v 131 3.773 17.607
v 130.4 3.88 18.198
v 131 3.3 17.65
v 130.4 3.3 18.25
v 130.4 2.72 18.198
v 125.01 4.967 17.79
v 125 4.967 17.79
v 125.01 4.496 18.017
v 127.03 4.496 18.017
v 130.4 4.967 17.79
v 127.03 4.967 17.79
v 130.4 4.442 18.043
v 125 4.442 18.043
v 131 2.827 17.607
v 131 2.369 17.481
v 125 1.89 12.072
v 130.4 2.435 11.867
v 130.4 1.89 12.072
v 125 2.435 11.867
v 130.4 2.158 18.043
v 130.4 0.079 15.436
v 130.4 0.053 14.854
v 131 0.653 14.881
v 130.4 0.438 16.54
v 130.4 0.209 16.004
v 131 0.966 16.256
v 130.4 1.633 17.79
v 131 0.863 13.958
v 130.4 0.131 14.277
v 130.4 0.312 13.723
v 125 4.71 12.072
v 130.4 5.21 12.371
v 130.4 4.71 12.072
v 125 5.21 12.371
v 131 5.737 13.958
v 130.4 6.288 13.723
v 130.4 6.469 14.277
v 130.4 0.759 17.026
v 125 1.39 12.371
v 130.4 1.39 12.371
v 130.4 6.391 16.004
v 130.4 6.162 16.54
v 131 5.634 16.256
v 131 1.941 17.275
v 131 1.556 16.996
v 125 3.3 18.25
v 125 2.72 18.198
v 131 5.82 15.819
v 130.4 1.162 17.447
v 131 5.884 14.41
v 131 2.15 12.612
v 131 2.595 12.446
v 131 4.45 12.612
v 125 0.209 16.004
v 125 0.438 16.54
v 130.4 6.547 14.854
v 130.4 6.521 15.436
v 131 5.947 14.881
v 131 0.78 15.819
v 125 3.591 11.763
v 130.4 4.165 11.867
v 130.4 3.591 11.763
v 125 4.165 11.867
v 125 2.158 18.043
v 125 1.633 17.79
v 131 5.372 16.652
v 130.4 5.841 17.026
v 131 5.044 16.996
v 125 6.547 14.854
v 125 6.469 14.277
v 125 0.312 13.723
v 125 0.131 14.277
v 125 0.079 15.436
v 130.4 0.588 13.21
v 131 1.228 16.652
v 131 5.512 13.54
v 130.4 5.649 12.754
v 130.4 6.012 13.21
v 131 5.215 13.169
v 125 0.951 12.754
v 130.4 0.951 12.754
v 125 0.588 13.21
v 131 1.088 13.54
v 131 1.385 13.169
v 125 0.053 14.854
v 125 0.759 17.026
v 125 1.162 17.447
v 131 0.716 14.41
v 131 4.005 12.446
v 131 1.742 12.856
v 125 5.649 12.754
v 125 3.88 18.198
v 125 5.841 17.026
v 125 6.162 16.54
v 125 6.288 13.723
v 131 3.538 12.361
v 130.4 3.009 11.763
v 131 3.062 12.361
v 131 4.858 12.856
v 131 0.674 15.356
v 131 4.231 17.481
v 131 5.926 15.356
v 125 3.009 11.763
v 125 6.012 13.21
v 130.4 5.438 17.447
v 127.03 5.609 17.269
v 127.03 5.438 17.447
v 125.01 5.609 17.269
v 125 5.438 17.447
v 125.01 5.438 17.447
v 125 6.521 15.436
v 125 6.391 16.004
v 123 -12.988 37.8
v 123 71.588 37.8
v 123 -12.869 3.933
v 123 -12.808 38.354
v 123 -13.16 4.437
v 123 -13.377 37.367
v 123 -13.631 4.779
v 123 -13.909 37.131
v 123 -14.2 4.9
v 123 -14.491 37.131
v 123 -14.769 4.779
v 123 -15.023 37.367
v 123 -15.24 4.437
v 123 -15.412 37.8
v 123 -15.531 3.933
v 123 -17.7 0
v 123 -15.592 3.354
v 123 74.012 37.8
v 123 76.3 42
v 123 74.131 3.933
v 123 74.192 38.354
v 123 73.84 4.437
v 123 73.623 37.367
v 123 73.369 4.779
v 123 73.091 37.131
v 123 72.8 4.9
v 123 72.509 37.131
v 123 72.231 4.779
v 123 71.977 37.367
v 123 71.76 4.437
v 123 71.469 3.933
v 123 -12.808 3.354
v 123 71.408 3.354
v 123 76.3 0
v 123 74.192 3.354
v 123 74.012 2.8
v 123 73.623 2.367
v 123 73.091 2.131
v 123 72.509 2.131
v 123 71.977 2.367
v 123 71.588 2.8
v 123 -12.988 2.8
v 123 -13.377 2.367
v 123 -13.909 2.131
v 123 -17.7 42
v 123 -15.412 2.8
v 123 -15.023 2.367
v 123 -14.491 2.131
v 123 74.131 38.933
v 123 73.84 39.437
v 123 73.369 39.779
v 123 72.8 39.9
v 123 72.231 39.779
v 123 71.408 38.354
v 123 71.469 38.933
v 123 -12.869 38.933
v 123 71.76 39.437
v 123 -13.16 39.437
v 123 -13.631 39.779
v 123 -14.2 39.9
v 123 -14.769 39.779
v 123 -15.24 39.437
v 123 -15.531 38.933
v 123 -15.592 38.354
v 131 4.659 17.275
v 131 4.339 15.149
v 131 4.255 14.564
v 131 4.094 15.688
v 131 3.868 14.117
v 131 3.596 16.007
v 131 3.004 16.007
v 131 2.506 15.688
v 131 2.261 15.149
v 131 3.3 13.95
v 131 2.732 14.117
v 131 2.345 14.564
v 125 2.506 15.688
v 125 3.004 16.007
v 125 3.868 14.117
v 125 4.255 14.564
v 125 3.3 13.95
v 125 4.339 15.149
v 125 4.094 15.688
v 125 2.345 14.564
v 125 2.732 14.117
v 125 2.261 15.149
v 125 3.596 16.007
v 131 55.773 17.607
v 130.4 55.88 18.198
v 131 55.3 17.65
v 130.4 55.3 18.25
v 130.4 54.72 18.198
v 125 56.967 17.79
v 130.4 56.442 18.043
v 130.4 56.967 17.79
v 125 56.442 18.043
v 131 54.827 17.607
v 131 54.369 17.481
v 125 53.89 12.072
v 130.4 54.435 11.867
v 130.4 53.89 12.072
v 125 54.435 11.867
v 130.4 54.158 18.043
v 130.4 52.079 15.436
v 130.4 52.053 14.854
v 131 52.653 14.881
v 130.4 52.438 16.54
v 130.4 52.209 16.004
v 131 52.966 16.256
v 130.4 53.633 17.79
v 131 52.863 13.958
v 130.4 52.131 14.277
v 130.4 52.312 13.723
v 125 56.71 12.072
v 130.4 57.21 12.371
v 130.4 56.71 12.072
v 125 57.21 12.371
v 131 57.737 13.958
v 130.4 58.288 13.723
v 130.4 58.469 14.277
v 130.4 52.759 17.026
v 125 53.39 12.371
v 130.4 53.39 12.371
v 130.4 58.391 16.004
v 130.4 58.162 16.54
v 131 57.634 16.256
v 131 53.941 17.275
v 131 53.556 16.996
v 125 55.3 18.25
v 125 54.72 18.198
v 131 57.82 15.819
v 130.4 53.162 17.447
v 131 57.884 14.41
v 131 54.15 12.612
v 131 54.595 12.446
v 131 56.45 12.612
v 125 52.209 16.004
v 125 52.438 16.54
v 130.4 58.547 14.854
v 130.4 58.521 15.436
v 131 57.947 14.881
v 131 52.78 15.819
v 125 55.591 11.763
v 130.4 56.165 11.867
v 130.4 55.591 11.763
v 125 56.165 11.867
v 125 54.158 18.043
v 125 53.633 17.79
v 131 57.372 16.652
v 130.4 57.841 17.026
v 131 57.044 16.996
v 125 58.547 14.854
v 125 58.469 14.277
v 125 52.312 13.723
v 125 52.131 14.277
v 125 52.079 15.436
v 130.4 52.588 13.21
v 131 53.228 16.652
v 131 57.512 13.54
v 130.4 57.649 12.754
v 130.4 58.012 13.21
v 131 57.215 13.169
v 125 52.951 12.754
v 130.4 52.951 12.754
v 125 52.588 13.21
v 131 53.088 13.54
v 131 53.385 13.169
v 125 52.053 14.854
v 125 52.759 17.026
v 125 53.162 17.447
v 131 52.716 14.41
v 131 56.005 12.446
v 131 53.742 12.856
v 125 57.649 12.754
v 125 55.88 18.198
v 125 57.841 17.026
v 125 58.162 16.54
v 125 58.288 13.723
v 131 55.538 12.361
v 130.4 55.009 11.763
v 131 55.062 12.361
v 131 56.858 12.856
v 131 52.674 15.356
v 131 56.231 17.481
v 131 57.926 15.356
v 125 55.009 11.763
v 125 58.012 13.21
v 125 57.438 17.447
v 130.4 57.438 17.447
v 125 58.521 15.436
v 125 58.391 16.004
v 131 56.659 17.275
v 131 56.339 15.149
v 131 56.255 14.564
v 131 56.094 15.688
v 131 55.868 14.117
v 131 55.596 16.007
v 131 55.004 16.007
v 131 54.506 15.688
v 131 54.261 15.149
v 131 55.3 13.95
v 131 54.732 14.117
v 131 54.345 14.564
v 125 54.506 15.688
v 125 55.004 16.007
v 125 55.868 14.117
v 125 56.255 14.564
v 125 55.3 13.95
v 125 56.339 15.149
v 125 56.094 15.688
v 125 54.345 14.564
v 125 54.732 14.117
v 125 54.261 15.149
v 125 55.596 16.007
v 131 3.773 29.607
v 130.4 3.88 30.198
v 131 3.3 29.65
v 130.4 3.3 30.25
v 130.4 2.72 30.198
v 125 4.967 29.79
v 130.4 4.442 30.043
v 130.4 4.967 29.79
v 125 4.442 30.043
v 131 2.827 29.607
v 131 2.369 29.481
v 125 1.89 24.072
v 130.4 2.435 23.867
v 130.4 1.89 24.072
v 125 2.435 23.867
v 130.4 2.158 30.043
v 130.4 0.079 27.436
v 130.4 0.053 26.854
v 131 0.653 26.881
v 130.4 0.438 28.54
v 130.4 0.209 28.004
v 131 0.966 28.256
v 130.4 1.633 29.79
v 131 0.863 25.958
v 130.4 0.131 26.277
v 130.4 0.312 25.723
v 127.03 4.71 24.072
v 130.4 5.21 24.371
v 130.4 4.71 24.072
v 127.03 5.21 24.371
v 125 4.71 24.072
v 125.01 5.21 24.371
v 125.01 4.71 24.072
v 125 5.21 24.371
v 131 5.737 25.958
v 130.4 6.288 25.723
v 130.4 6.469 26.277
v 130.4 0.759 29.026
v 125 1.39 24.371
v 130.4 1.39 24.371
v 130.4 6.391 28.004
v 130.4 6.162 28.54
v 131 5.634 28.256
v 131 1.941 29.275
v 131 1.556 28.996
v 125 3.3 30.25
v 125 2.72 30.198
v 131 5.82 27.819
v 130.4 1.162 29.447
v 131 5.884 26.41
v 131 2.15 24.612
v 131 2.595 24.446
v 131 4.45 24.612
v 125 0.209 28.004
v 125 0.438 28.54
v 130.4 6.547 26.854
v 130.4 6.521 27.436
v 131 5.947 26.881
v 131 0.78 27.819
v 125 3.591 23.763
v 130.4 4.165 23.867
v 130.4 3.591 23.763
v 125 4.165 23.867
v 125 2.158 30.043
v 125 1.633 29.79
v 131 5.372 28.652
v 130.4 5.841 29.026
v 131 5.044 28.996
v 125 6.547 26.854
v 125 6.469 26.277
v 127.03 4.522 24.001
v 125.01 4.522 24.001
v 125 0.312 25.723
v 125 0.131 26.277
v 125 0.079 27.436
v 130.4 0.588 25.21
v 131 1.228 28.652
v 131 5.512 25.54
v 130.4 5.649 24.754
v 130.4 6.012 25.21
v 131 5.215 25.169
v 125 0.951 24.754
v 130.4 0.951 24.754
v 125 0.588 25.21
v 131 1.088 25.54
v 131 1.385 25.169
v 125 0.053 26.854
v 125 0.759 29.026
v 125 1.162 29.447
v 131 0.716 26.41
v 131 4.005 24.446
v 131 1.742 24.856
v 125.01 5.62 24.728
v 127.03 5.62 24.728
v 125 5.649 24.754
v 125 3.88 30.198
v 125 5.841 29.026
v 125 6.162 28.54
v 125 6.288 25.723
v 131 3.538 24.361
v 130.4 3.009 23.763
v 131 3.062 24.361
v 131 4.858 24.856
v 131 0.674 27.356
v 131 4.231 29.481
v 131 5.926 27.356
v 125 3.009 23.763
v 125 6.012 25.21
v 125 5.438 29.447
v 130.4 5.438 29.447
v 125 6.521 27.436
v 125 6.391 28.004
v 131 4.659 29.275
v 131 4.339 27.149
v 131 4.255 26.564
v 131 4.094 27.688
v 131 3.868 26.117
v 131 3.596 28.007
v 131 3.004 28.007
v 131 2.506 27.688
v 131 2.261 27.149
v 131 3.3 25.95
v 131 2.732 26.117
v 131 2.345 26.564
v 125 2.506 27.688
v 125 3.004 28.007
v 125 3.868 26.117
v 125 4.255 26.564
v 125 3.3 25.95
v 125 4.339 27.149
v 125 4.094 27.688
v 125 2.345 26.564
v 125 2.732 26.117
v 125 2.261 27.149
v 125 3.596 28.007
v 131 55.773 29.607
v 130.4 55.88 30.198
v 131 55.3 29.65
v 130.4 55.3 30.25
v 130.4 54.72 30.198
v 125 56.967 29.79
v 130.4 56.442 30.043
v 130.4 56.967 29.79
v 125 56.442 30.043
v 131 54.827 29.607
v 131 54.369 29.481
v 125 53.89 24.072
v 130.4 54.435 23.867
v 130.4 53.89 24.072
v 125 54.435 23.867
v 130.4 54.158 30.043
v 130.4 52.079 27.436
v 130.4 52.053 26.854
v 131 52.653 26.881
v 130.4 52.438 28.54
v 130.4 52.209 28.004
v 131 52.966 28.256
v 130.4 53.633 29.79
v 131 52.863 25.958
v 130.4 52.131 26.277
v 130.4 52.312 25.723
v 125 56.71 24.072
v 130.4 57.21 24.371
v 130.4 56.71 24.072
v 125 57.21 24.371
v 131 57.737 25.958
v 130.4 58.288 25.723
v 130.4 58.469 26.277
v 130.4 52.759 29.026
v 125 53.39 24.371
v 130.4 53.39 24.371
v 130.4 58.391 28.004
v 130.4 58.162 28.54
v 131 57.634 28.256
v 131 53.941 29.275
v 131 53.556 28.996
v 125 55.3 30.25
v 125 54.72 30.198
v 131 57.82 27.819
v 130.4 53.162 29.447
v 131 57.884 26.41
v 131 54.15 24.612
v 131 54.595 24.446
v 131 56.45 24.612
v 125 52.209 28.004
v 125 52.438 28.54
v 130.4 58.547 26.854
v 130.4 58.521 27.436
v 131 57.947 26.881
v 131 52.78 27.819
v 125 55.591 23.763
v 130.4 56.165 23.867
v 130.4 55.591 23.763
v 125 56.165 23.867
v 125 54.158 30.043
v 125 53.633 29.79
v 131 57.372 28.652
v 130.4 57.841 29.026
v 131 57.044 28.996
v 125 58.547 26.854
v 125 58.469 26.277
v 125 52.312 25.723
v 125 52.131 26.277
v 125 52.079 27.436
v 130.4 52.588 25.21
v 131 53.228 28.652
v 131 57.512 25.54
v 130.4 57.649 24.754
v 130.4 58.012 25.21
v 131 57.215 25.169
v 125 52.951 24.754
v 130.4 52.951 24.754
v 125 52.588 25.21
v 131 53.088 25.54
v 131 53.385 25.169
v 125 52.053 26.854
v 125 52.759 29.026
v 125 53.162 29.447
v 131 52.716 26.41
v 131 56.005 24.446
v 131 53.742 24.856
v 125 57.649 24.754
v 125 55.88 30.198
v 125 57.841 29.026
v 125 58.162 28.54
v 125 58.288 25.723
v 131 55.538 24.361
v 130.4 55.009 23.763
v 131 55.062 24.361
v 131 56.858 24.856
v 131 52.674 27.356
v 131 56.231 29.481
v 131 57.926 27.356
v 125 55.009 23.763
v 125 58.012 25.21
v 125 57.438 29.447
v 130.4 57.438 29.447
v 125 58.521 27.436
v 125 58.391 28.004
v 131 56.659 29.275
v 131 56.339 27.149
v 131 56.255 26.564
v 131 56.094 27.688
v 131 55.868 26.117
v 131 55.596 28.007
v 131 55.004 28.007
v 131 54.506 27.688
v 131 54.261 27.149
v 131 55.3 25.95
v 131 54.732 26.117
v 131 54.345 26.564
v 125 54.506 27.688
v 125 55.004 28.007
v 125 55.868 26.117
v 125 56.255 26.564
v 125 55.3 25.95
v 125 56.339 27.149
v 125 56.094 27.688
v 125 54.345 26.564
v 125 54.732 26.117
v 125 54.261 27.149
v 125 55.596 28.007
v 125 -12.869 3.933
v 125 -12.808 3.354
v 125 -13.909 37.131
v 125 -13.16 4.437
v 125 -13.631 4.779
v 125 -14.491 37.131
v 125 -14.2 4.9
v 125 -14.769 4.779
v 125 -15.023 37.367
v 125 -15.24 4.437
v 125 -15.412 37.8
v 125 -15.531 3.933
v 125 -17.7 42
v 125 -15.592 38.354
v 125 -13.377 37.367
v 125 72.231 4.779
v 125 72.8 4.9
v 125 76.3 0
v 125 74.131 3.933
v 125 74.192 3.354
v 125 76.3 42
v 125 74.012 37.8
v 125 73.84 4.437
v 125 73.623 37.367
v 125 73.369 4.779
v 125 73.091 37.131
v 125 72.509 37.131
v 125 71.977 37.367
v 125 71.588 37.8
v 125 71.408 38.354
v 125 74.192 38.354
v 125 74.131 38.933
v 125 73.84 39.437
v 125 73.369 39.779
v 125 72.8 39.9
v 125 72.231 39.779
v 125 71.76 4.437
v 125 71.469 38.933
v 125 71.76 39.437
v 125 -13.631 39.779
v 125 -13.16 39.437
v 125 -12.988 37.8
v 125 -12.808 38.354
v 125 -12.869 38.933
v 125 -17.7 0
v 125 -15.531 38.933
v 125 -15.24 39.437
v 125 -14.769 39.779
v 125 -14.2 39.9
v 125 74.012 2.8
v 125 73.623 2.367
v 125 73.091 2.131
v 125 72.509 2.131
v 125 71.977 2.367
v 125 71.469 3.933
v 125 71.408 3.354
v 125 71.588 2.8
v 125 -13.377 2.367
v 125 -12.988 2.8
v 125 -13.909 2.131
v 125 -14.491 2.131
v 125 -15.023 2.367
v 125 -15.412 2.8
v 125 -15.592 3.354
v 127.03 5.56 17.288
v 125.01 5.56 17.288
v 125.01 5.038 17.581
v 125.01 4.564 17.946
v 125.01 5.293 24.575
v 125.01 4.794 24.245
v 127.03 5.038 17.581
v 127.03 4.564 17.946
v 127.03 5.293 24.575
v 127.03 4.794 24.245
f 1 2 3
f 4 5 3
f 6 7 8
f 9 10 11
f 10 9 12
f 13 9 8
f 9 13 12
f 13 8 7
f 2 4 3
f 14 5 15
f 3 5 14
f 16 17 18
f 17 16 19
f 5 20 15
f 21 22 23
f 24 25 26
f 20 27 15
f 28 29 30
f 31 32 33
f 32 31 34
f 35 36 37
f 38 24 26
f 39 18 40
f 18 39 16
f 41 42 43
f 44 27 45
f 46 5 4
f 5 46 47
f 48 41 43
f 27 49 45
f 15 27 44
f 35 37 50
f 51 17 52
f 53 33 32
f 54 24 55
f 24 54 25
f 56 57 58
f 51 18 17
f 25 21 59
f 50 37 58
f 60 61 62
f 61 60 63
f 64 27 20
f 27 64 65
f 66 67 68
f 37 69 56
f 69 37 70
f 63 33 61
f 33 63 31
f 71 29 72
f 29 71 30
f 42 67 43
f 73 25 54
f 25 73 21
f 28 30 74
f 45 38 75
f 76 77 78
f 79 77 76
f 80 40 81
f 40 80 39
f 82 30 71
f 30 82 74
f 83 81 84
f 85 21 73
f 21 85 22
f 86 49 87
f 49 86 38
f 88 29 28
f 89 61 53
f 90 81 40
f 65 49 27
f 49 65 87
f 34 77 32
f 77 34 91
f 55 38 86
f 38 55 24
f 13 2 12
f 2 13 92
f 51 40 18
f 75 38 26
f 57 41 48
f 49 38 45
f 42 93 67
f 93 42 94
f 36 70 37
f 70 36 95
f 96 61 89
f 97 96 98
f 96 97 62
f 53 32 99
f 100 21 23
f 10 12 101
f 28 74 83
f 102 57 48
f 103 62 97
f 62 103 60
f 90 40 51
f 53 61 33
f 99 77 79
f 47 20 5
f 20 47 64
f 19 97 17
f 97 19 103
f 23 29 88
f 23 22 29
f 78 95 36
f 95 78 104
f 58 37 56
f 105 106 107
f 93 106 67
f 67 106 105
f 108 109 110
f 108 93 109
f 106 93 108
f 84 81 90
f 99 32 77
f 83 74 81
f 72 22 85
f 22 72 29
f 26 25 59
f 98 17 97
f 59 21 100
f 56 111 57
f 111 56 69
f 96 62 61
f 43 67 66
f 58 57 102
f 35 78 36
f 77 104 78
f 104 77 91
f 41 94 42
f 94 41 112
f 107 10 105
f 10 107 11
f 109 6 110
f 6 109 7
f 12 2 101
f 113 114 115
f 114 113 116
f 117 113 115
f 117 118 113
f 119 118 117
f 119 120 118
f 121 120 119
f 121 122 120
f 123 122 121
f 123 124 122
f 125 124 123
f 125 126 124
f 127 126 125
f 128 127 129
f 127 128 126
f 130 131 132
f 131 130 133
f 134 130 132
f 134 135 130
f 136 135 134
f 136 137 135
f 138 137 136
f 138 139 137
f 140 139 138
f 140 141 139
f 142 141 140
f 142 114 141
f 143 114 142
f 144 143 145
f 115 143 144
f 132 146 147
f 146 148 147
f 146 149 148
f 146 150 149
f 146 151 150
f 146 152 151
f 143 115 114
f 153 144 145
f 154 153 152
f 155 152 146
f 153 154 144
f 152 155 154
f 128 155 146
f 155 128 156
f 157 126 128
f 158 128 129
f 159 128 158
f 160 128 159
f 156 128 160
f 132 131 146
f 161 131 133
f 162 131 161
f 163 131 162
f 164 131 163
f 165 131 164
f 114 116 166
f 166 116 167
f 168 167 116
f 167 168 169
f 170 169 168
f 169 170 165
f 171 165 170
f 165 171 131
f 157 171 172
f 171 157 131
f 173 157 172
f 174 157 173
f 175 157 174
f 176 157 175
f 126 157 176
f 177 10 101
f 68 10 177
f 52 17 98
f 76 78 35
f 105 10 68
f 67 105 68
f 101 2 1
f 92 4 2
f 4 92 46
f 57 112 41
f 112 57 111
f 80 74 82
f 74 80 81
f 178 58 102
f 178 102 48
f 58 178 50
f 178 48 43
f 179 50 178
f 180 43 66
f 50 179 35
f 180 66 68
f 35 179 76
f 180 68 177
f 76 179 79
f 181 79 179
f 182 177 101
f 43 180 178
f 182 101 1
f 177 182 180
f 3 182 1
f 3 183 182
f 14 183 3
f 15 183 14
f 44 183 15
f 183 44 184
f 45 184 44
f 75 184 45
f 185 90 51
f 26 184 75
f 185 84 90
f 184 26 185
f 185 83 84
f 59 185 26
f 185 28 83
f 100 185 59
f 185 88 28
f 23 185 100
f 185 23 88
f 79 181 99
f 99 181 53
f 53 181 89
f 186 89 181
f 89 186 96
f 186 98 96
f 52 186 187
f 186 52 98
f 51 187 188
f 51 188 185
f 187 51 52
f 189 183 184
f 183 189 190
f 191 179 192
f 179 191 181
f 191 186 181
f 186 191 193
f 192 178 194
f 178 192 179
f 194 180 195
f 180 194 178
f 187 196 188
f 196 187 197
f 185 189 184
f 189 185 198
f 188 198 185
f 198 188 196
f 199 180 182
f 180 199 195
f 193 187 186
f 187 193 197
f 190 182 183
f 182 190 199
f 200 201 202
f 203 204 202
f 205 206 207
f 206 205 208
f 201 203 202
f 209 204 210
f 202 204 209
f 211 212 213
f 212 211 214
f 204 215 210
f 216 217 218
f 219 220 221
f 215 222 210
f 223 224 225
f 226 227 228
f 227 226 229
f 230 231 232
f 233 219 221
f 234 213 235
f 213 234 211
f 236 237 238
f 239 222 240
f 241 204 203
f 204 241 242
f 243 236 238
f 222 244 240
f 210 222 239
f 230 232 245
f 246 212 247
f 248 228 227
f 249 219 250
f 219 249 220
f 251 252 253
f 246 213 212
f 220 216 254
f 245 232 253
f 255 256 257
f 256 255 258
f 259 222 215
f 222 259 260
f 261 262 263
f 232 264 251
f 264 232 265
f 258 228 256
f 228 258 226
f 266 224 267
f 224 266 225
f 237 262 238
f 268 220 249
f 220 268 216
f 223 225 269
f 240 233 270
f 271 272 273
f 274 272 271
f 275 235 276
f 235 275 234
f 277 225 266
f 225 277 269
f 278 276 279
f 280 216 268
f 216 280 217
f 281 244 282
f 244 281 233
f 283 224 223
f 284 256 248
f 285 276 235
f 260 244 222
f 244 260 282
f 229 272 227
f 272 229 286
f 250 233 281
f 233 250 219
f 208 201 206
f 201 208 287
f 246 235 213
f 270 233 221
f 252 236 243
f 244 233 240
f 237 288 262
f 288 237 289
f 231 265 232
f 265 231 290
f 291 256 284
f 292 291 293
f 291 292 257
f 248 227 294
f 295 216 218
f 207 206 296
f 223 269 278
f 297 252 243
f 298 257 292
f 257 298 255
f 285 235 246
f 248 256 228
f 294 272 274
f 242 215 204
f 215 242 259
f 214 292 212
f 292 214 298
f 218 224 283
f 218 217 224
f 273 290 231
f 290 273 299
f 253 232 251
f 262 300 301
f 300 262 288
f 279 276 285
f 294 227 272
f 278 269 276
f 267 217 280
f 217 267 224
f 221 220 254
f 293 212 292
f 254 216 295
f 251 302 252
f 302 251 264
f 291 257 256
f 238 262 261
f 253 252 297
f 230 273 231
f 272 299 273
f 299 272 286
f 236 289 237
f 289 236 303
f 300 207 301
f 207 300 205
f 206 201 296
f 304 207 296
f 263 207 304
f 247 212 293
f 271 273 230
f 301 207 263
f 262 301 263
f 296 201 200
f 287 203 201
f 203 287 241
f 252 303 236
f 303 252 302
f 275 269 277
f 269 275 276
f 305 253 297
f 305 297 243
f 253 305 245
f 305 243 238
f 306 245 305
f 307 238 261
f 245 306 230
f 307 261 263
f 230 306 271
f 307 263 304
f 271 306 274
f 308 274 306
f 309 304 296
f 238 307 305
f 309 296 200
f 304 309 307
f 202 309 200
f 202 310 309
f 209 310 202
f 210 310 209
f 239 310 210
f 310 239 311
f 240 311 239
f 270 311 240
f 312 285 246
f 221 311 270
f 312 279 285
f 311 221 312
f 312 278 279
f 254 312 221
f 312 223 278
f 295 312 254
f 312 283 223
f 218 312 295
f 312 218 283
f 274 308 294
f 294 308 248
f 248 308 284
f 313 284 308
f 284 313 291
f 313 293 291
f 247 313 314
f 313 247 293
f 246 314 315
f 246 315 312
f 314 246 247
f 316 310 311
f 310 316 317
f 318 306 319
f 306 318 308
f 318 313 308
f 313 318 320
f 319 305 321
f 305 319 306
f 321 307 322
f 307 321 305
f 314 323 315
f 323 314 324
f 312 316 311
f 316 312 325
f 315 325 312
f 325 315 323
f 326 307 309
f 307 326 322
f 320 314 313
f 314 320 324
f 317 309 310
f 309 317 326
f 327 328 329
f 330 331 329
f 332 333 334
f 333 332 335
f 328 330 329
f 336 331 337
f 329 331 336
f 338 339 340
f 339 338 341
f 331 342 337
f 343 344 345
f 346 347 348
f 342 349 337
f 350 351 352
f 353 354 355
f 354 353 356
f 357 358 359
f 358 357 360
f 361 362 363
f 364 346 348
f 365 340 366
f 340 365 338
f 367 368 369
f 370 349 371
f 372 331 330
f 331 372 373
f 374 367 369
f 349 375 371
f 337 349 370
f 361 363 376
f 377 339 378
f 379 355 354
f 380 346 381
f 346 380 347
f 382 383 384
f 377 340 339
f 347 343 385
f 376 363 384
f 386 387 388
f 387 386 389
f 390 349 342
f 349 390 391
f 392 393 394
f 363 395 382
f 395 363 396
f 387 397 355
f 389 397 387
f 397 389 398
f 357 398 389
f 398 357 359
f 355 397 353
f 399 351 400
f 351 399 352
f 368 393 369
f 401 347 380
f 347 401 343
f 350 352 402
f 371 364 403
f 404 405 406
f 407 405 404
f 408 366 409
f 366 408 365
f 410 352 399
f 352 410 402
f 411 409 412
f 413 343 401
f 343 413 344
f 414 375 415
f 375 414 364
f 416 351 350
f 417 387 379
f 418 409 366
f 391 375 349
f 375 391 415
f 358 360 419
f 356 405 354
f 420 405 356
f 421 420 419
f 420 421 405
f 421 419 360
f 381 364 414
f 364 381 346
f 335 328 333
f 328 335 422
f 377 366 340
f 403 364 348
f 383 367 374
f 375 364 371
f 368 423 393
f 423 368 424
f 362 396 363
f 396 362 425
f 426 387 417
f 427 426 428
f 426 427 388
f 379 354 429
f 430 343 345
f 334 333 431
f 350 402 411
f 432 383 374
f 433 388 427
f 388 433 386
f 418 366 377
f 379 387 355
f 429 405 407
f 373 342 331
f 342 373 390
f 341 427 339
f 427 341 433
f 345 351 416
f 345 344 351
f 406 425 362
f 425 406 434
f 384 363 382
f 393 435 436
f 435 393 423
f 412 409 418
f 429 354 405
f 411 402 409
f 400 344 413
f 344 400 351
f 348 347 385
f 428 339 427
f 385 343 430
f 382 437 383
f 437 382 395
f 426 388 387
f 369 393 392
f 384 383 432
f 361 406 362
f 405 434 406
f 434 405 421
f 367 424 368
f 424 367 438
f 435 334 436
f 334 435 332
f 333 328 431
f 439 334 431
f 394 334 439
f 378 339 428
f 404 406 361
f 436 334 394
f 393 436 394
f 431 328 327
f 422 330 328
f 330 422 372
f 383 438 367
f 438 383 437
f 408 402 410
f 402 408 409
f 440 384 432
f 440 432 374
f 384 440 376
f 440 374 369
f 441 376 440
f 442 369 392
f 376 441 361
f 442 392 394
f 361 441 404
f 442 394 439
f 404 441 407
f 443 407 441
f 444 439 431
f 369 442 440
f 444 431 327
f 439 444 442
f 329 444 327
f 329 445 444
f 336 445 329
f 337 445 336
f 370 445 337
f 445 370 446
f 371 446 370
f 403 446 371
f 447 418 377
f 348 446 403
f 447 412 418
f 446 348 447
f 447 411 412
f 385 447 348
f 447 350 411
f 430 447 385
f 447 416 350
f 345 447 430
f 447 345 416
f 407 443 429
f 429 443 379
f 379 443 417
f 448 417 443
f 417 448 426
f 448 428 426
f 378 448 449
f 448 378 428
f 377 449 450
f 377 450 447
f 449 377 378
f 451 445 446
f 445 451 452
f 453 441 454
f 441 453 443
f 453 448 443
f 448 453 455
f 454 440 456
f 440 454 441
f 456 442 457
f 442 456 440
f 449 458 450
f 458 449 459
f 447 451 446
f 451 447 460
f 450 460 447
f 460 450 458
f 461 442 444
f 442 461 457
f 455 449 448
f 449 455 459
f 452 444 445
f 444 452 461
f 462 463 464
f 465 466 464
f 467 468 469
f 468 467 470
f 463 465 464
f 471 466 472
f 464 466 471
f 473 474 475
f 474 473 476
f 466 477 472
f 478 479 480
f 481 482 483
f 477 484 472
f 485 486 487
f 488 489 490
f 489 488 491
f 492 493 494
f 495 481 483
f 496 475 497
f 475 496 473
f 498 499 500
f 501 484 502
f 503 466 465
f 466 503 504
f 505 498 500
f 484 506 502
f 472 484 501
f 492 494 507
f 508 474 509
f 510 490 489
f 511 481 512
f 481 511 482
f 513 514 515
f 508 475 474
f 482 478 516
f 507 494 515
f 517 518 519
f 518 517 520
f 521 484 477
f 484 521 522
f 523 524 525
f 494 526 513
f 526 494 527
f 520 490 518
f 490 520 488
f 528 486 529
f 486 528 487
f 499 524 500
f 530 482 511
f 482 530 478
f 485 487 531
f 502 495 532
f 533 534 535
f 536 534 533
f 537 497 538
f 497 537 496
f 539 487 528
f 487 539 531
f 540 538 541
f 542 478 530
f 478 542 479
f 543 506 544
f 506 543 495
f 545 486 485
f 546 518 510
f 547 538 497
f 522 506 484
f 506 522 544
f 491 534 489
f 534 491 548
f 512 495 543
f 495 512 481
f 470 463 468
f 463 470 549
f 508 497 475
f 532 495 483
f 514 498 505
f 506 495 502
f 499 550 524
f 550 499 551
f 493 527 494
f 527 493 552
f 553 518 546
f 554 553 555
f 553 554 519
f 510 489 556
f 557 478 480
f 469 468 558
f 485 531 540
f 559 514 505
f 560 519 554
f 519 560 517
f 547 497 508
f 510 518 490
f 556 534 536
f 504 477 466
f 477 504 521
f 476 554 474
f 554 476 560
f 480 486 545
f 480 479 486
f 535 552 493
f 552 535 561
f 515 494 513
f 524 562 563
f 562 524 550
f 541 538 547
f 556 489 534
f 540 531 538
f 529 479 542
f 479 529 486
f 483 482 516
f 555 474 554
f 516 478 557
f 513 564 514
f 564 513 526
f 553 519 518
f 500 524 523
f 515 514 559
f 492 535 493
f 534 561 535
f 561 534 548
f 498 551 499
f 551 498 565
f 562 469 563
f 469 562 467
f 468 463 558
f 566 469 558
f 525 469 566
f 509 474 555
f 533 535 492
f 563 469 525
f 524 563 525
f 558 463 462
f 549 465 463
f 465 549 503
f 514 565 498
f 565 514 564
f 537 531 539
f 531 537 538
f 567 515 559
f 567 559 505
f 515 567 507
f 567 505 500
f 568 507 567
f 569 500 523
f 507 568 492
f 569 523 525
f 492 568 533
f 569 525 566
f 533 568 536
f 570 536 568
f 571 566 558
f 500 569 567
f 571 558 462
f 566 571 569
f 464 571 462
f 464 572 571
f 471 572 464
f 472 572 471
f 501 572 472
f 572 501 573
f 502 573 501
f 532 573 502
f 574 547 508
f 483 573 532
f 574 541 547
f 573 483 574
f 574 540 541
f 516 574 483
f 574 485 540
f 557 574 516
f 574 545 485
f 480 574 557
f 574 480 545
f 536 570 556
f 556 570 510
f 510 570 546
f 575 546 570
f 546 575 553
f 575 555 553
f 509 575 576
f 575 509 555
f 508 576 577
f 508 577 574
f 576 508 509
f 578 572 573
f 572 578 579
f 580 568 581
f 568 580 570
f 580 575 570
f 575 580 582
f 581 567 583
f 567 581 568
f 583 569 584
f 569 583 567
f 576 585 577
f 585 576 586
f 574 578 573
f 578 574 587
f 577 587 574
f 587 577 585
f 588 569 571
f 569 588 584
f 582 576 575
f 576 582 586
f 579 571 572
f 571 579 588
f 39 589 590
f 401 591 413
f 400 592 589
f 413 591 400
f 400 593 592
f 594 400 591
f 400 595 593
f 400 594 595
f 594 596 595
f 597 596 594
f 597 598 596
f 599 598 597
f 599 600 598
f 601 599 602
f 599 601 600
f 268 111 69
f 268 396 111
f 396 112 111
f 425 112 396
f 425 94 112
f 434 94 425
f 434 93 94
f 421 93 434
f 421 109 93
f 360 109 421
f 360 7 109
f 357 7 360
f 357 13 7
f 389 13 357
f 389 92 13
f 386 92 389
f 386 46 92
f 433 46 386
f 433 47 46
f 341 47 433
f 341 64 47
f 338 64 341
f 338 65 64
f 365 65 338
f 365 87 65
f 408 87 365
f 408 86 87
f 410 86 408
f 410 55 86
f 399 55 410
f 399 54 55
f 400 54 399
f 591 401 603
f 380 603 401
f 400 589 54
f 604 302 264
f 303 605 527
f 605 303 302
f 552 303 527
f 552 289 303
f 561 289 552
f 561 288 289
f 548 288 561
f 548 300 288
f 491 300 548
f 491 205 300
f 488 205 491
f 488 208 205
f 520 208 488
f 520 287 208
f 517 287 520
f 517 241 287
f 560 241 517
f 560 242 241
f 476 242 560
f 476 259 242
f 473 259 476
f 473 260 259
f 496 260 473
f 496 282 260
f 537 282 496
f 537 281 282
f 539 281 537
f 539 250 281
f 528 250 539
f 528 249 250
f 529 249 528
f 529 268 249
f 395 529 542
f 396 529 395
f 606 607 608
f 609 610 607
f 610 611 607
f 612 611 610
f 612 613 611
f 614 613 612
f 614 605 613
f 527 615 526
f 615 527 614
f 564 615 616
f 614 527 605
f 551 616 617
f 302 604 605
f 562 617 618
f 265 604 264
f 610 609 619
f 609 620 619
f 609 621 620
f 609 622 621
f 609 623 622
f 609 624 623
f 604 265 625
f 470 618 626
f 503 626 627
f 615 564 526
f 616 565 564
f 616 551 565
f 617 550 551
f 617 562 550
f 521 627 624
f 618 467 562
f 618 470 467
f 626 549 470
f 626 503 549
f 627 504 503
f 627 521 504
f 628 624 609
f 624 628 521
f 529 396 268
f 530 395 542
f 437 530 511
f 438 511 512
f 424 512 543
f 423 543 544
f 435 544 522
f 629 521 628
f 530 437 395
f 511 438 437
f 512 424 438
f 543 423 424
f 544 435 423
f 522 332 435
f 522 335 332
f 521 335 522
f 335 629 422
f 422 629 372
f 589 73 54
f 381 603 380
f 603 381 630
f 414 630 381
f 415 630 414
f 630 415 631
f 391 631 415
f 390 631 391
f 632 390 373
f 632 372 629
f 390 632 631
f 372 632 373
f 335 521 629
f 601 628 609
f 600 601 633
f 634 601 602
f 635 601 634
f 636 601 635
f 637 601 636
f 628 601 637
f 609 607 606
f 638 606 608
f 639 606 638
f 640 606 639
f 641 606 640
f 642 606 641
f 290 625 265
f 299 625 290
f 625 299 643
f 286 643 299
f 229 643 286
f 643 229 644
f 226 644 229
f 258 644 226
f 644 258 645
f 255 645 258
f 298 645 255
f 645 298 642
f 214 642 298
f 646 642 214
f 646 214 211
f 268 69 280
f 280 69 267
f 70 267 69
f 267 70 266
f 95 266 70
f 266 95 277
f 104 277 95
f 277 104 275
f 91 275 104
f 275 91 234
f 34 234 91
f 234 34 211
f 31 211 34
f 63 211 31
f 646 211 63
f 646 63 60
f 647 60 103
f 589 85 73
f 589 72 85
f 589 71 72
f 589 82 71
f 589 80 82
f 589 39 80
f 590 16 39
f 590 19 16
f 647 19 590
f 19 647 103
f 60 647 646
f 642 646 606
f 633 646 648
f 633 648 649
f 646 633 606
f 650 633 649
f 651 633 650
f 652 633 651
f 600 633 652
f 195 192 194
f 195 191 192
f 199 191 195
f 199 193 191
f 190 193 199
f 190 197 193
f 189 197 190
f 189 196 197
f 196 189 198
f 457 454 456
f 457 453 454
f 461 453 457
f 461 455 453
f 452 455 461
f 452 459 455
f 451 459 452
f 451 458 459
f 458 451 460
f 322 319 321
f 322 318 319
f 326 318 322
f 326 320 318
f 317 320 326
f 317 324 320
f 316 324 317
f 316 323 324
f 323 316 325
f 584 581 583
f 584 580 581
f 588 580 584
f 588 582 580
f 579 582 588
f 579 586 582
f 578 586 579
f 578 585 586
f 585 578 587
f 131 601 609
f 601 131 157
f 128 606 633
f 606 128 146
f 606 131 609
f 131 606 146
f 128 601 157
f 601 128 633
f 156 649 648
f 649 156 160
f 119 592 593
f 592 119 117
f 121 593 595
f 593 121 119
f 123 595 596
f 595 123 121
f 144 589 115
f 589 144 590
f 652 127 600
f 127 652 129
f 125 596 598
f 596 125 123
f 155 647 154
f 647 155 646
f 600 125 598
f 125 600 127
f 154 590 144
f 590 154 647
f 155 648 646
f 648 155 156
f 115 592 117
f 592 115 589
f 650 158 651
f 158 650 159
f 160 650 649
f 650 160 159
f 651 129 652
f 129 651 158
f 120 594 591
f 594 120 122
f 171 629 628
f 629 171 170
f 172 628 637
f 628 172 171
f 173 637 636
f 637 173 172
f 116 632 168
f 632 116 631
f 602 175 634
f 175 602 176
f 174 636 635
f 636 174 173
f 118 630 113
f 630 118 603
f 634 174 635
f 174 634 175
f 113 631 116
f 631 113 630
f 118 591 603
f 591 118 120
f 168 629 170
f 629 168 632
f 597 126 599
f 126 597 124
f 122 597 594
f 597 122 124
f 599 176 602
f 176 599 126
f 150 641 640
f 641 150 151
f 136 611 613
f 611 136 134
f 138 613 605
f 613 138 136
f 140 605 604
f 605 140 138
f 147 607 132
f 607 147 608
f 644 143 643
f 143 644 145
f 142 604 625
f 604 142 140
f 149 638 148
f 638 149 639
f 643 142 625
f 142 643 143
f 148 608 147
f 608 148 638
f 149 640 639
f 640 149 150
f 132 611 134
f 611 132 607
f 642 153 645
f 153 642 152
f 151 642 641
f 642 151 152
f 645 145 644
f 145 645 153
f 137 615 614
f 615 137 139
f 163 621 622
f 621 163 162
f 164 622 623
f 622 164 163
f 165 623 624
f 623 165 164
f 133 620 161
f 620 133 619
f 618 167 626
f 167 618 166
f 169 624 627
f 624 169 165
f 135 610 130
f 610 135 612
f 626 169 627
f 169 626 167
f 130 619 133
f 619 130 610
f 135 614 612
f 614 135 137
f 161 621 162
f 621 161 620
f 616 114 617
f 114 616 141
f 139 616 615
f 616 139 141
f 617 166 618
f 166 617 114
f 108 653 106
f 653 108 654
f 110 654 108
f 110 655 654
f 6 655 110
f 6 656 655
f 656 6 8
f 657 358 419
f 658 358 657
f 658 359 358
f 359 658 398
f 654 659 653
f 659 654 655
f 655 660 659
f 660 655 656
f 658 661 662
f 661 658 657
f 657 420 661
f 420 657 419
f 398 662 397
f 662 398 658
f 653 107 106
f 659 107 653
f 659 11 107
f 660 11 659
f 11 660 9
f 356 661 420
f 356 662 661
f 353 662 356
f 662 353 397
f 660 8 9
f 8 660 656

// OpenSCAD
// file: ../lib/common.scad
// ============================================================================
//  Вспомогательные модули общего назначения.
//  Подключать через use <lib/common.scad> — файл не содержит параметров
//  проекта и ни от чего не зависит.
// ============================================================================

_eps = 0.01;

// --------------------------------------------------------------------- 2D ---
// Прямоугольник со скруглёнными углами, по центру
module rrect(w, d, r) {
    rr = min(r, w/2 - _eps, d/2 - _eps);
    if (rr > 0) offset(r = rr) square([w - 2*rr, d - 2*rr], center = true);
    else square([w, d], center = true);
}

// --------------------------------------------------------------------- 3D ---
// Коробка со скруглением ТОЛЬКО вертикальных рёбер: нижние и верхние острые
module rounded_box(w, d, h, r) linear_extrude(height = h) rrect(w, d, r);

// Цилиндр с фасками на торцах (снимает «слоновью ногу» и облегчает посадку)
module chamfered_cyl(d, h, ch = 0.6, bottom = true, top = true) {
    r  = d/2;
    cb = bottom ? min(ch, h/2) : 0;
    ct = top    ? min(ch, h/2) : 0;
    if (cb <= 0 && ct <= 0) cylinder(d = d, h = h);
    else rotate_extrude(angle = 360) polygon(concat(
        [[0, 0]],
        cb > 0 ? [[r - cb, 0], [r, cb]] : [[r, 0]],
        ct > 0 ? [[r, h - ct], [r - ct, h]] : [[r, h]],
        [[0, h]]));
}

// Труба
module tube(od, id, h) difference() {
    cylinder(d = od, h = h);
    translate([0, 0, -_eps]) cylinder(d = id, h = h + 2*_eps);
}

// Сквозное отверстие, растянутое вверх-вниз для гарантированного вычитания
module thru(d, h) translate([0, 0, -_eps]) cylinder(d = d, h = h + 2*_eps);

// Потайное отверстие под саморез с конической головкой.
// Пластина занимает z = [0 .. t], головка утапливается сверху,
// саморез идёт вниз (в ответную стойку).
module countersunk_hole(free_d, head_d, t, down = 30) {
    cone_h = (head_d - free_d)/2;    // головка 90 градусов
    union() {
        translate([0, 0, -down]) cylinder(d = free_d, h = down + t - cone_h + _eps);
        translate([0, 0, t - cone_h]) cylinder(d1 = free_d, d2 = head_d, h = cone_h);
    }
}

// Паз (щелевое отверстие) длиной len по X, сквозной по высоте h
module slot(len, d, h) hull() for (s = [-1, 1])
    translate([s*(len - d)/2, 0, 0]) cylinder(d = d, h = h);

// Стойка под саморез: цилиндр с пилотным отверстием сверху.
// Снизу фаски нет — стойка растёт из дна детали.
module screw_boss(od, h, pilot_d, pilot_depth, ch = 0.6) difference() {
    chamfered_cyl(od, h, ch = ch, bottom = false, top = true);
    translate([0, 0, h - pilot_depth]) cylinder(d = pilot_d, h = pilot_depth + _eps);
}

// Треугольная косынка в плоскости XZ (катеты l по X и h по Z), толщина t по Y
module gusset(l, h, t) translate([0, -t/2, 0]) linear_extrude(height = t)
    polygon([[0, 0], [l, 0], [0, h]]);

// Конусное гнездо под заточенный винт-ось (ось Z вниз от z=0)
module cone_seat(d, depth) translate([0, 0, -depth])
    cylinder(d1 = 0.2, d2 = d, h = depth + _eps);

// Канавка под круглый пассик: тор, вычитаемый из обода
module belt_groove(pulley_d, groove_r) rotate_extrude(angle = 360)
    translate([pulley_d/2, 0]) circle(r = groove_r);

// Сетка облегчающих отверстий по кругу
module radial_holes(n, r, d, h) for (i = [0 : n - 1])
    rotate([0, 0, i*360/n]) translate([r, 0, 0]) thru(d, h);
// main file
// ============================================================================
//  ПАНЕЛЬ РАЗЪЁМОВ (съёмная вставка в правой стенке поддона)
//
//  Та же схема, что у передней панели: окно с четвертью, панель заподлицо
//  снаружи. Сюда выводятся питание, линейный выход и прочее — список
//  отверстий в params.scad, поддон не трогается.
//
//  Печать: плашмя, лицом на стол (лицо получается ровным),
//  стойки печатаются вверх.
// ============================================================================

include <../params.scad>
use <../lib/common.scad>

module io_hole(y, d) {
    translate([case_w/2 + eps, io_panel_y + y, io_panel_z]) rotate([0, 90, 0])
        cylinder(d = d, h = panel_t + 2*eps);
}

module io_panel() {
    difference() {
        union() {
            translate([case_w/2 - panel_t/2, io_panel_y, io_panel_z])
                cube([panel_t, io_panel_plate[0], io_panel_plate[1]], center = true);
            for (p = io_panel_pcb_hole)
                translate([case_w/2 - panel_t, io_panel_y + p[0], io_panel_z + p[1]])
                    rotate([0, 90, 0])
                        screw_boss(scr25_boss_d, io_panel_pcb_h, scr25_pilot,
                                   io_panel_pcb_h - 1);
        }
        for (y = io_dc_y)   io_hole(y, io_dc_d);
        for (y = io_jack_y) io_hole(y, io_jack_d);
        for (p = io_panel_scr_pos)
            translate([case_w/2 - panel_t, p[0], p[1]]) rotate([0, -90, 0])
                countersunk_hole(scr25_free, scr25_head_d, panel_t);
    }
}

io_panel();
